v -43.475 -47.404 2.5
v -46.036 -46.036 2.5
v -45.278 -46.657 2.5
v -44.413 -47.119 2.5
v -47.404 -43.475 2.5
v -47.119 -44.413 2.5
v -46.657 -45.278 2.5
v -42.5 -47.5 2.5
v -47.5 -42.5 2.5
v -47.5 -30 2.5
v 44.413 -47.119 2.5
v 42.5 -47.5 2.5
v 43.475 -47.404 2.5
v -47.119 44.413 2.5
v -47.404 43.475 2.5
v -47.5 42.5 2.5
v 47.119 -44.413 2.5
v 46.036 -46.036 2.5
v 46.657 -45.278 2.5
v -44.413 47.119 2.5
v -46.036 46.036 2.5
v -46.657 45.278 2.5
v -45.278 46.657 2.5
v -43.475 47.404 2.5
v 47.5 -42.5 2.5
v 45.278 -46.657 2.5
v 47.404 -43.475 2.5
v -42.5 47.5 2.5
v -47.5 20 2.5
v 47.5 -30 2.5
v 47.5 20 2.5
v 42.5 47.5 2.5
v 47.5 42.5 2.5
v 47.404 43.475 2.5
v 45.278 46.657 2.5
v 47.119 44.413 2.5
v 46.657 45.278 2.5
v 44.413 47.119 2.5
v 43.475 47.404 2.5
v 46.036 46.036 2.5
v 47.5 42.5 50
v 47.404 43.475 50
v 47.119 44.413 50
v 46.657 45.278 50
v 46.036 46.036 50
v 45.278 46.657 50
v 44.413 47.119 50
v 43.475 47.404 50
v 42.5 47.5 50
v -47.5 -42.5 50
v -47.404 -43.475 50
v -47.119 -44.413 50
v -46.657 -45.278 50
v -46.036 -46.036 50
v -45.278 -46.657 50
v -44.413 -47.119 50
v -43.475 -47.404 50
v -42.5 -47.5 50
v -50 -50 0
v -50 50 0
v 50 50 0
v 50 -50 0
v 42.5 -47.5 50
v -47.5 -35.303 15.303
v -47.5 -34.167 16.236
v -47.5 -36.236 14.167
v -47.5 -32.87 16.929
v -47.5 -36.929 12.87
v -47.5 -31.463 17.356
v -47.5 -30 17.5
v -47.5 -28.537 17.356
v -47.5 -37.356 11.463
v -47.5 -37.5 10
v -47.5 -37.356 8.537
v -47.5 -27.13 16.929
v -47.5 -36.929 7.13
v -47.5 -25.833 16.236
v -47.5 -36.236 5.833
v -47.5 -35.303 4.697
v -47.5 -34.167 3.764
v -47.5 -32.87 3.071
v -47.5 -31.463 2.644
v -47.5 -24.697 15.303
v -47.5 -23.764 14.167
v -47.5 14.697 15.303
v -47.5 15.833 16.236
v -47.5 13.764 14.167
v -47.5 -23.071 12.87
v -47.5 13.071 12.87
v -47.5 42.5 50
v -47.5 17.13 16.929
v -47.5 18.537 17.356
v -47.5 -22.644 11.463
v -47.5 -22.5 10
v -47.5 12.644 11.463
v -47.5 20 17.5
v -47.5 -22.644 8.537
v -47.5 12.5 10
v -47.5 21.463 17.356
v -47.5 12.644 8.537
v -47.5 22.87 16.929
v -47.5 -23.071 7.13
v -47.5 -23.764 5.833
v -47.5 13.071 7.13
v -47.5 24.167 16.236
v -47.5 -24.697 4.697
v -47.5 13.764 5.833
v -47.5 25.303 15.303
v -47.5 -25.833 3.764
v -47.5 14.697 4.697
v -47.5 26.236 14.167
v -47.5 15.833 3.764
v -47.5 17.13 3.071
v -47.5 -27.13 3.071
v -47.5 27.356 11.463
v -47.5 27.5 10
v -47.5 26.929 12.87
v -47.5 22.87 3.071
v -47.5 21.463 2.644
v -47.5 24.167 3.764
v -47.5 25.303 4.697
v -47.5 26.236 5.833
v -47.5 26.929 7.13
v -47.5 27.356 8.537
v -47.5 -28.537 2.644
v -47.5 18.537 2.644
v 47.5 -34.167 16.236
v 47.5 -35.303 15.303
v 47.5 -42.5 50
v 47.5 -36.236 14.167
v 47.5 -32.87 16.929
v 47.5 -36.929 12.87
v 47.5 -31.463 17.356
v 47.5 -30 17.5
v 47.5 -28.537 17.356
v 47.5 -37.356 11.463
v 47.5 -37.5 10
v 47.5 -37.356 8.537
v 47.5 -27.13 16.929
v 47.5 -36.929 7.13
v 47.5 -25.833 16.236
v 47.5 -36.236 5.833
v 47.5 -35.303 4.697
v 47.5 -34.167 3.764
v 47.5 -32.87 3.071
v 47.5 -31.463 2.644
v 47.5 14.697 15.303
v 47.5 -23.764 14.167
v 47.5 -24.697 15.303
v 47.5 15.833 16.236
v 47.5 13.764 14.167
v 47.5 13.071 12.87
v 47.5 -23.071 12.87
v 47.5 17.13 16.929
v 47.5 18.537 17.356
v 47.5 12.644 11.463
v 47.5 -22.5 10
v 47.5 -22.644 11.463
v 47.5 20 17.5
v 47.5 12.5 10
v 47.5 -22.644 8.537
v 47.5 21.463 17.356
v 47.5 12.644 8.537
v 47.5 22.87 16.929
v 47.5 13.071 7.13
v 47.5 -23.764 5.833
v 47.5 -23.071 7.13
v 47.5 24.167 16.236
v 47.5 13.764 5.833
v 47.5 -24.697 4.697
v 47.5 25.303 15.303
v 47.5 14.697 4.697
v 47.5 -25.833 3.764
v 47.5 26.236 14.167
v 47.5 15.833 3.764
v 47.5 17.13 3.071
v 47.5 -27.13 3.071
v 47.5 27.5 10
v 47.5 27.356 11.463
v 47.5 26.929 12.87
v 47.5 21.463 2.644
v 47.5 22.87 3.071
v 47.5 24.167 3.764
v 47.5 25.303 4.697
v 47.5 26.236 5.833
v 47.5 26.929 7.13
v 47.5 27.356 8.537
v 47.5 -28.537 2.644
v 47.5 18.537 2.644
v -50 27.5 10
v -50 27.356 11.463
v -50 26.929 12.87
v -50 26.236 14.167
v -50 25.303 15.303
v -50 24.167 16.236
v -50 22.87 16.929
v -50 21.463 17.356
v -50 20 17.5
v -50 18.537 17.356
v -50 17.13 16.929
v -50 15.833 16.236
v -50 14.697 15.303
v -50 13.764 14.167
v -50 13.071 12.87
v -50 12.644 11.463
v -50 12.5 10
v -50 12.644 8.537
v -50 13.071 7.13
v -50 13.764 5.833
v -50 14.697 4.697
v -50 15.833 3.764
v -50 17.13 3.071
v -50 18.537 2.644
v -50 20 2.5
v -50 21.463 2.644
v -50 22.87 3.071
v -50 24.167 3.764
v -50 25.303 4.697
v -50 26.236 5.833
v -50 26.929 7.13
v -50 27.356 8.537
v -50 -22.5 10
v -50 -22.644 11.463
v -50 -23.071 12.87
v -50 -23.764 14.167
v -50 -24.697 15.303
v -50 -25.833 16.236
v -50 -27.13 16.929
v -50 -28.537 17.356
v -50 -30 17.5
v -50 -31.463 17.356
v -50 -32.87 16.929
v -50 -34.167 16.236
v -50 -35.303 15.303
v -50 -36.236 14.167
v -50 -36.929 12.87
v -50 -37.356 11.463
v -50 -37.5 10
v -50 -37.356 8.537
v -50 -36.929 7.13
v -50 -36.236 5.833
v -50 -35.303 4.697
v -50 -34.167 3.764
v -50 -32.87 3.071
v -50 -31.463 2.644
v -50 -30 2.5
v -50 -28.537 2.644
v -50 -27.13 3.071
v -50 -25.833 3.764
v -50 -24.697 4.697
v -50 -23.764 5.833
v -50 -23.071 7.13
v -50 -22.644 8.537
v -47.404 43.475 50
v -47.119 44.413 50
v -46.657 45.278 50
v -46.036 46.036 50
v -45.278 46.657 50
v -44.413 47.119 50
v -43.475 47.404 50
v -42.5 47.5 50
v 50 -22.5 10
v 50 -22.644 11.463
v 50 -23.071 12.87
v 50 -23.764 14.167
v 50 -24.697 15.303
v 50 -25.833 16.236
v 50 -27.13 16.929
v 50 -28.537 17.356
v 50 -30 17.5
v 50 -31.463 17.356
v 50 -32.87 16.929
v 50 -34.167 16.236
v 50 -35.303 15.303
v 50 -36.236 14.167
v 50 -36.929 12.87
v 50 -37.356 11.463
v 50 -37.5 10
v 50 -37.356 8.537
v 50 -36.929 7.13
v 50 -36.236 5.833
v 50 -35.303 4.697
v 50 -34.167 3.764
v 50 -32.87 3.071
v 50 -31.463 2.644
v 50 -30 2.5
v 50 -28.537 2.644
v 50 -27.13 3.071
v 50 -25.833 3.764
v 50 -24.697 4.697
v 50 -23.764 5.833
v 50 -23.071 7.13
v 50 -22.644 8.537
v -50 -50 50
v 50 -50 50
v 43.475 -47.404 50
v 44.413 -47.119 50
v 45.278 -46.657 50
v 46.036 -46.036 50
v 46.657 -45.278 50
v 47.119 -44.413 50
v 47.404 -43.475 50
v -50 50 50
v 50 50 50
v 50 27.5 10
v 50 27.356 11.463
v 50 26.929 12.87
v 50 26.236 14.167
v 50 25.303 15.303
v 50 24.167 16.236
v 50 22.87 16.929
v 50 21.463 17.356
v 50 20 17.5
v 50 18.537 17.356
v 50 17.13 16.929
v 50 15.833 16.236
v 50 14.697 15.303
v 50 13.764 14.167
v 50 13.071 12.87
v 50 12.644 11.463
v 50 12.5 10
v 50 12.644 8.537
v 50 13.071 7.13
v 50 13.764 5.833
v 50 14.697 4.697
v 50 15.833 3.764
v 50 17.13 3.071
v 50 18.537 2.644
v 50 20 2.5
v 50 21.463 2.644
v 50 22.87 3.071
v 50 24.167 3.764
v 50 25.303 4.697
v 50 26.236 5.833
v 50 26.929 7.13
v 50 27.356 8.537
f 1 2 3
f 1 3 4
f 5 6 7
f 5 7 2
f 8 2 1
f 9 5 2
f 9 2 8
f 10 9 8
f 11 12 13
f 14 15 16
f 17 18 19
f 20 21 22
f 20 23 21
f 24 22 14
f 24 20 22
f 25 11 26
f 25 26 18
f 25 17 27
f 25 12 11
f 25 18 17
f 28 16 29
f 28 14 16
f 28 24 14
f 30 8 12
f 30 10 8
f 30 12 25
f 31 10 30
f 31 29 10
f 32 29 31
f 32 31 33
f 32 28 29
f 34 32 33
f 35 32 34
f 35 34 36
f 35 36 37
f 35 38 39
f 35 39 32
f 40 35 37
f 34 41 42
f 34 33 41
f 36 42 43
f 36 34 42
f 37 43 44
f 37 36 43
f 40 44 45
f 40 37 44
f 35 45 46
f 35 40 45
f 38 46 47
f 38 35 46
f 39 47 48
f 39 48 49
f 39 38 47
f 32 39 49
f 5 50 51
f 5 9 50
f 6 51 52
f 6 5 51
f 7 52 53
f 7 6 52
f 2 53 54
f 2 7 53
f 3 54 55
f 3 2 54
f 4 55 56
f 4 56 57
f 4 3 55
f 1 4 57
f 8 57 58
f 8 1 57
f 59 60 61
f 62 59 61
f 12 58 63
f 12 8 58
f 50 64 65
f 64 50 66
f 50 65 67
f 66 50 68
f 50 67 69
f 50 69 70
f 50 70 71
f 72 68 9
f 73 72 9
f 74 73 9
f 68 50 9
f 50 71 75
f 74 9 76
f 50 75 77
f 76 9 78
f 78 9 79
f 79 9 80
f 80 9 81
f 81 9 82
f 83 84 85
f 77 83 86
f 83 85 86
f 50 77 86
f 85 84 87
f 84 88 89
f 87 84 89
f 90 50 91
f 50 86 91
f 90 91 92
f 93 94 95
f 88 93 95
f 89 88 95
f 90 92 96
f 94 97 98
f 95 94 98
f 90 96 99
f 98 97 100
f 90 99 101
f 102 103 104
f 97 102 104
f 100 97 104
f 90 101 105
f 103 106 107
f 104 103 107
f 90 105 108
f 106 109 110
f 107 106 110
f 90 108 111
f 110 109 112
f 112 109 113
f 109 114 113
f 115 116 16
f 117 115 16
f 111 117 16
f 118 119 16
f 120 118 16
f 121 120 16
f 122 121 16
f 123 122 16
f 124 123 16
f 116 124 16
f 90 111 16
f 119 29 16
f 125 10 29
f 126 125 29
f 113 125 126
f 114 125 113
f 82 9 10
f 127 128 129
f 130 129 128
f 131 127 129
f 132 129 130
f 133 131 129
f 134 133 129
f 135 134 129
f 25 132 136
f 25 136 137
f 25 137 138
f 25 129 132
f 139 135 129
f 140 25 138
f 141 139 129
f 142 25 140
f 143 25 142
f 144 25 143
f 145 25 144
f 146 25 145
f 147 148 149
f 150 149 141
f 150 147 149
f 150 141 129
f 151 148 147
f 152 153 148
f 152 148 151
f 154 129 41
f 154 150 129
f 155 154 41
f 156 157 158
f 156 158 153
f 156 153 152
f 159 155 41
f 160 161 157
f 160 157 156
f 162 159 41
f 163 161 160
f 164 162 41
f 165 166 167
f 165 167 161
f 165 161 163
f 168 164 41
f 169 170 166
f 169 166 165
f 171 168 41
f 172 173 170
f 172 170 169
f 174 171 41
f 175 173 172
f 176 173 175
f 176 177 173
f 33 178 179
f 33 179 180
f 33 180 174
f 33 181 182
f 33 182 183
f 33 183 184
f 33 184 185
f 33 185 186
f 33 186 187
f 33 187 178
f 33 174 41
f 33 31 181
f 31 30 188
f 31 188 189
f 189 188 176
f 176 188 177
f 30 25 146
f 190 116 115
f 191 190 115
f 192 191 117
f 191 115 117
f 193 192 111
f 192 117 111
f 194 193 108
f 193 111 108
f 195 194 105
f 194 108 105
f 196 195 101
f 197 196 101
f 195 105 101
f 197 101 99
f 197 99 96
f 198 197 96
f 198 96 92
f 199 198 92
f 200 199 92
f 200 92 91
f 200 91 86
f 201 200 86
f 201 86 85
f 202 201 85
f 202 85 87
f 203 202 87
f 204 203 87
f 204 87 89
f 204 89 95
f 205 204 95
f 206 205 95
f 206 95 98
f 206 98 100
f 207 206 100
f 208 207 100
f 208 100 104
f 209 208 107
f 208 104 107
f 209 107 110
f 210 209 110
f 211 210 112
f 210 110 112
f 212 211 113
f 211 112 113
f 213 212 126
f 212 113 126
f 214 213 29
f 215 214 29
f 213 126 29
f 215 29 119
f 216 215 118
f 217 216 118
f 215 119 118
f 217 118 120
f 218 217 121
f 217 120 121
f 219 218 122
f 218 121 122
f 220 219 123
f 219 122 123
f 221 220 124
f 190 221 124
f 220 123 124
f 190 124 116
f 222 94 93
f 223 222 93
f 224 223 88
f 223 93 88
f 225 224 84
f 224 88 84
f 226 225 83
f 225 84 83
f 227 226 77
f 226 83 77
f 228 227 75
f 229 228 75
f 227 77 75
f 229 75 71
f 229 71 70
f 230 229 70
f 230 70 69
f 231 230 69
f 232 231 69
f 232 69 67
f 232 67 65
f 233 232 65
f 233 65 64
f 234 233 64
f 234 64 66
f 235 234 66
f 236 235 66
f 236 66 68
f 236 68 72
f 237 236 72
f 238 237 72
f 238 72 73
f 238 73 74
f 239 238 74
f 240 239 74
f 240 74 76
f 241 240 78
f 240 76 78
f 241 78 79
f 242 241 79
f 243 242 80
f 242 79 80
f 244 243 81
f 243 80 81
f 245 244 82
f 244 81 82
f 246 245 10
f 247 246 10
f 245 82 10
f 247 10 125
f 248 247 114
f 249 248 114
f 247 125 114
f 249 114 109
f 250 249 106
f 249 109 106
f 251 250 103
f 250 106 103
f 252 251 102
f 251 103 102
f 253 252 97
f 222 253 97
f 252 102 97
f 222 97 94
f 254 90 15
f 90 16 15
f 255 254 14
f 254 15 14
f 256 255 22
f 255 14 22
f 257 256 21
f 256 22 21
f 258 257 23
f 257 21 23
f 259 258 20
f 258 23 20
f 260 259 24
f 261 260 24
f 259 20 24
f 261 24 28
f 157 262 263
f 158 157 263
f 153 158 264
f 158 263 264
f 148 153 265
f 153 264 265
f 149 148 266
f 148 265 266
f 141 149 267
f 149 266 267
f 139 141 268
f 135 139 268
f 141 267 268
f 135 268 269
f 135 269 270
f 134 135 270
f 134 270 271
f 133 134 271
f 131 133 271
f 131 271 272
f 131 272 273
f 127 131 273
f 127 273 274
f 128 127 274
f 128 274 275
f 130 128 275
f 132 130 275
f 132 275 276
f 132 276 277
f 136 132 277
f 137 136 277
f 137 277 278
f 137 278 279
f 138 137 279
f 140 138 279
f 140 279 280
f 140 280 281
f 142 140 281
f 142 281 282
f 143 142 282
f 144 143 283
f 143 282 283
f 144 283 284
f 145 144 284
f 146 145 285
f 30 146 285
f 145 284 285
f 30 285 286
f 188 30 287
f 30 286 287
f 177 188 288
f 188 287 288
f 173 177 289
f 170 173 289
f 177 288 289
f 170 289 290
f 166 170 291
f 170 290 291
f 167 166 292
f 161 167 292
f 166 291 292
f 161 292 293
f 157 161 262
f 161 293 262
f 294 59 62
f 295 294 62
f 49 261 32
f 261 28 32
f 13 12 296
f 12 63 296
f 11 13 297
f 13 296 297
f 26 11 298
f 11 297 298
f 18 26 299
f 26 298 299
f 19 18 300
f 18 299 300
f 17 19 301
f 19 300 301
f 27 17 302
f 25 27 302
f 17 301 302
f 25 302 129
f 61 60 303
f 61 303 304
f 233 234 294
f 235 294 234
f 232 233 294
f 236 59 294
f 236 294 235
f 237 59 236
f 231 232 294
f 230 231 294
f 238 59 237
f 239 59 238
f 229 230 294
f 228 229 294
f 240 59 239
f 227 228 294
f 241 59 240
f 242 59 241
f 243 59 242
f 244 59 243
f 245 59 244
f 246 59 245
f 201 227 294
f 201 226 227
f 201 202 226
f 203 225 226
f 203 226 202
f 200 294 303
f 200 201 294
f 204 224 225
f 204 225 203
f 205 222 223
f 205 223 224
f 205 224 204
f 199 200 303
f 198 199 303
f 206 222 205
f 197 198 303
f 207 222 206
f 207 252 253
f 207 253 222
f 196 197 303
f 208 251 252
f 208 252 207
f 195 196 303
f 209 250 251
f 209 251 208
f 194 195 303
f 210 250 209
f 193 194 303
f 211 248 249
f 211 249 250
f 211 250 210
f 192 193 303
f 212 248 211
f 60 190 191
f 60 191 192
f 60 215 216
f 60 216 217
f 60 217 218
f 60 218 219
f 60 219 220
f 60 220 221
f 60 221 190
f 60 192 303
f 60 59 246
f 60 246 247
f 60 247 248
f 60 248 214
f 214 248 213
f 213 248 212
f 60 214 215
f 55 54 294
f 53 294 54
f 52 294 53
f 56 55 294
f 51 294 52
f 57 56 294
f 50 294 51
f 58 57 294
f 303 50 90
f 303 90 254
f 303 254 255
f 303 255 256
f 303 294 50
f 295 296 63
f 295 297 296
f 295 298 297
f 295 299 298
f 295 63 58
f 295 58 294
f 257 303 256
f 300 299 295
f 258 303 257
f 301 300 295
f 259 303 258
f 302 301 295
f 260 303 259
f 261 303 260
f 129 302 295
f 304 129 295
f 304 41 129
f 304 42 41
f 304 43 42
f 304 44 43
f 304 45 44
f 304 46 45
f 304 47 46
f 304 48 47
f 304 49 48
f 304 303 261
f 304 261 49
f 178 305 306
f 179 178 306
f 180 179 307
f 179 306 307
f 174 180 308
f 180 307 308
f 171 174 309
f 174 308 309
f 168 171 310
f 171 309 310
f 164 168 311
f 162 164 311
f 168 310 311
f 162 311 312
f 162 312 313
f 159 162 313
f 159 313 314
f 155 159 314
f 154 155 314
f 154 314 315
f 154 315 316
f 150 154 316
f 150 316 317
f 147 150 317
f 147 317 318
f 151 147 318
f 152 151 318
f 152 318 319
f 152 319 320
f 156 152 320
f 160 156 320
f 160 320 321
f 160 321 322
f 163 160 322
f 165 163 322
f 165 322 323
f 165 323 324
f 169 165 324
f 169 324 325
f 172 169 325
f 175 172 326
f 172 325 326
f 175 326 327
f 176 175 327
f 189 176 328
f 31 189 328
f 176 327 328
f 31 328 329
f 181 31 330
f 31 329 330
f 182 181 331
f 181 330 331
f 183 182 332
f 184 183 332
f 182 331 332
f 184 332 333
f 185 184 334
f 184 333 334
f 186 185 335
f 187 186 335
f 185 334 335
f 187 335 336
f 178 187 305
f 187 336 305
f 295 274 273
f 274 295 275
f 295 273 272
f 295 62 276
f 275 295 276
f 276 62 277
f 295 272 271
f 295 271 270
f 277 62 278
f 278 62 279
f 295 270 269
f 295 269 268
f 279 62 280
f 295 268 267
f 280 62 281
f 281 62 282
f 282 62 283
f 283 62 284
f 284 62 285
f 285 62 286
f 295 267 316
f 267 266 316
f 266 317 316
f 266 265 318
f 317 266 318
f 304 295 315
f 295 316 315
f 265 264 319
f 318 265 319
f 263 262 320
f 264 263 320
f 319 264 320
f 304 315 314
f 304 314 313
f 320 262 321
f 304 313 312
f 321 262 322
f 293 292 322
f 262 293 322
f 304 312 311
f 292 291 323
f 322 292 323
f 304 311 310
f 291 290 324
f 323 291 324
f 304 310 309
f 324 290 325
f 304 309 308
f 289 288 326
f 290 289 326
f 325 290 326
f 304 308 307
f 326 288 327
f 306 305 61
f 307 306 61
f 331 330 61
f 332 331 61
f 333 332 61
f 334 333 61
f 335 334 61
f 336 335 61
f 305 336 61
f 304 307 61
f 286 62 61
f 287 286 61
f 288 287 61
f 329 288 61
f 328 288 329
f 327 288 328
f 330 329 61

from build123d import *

# Parameters (mm, degrees)
F0_W     = 100
F0_H     = 100
F1_DEPTH = 50
F2_T     = -2.5
F3_R     = 5
F4_R     = 7.5
F5_DEPTH = 100.001


with BuildPart() as f1:
    # F0 (on Top) → F1 (new body)
    with BuildSketch(Plane.XY):
        Rectangle(F0_W, F0_H)
    extrude(amount=F1_DEPTH)

    # F2
    f2_openings = [f1.faces().sort_by_distance(p)[0] for p in [
        (0, 0, 50),
    ]]
    offset(amount=F2_T, openings=f2_openings)

    # F3
    f3_edges = [f1.edges().sort_by_distance(p)[0] for p in [
        (-47.5, 47.5, 26.25),
        (47.5, 47.5, 26.25),
        (-47.5, -47.5, 26.25),
        (47.5, -47.5, 26.25),
    ]]
    fillet(f3_edges, radius=F3_R)

    # F4 (on face) → F5 (cut, through all)
    with BuildSketch(Plane.YZ.offset(50)):
        with Locations((-30, 10)):
            Circle(F4_R)
        with Locations((20, 10)):
            Circle(F4_R)
    extrude(amount=-F5_DEPTH, mode=Mode.SUBTRACT)


solid = f1.part
